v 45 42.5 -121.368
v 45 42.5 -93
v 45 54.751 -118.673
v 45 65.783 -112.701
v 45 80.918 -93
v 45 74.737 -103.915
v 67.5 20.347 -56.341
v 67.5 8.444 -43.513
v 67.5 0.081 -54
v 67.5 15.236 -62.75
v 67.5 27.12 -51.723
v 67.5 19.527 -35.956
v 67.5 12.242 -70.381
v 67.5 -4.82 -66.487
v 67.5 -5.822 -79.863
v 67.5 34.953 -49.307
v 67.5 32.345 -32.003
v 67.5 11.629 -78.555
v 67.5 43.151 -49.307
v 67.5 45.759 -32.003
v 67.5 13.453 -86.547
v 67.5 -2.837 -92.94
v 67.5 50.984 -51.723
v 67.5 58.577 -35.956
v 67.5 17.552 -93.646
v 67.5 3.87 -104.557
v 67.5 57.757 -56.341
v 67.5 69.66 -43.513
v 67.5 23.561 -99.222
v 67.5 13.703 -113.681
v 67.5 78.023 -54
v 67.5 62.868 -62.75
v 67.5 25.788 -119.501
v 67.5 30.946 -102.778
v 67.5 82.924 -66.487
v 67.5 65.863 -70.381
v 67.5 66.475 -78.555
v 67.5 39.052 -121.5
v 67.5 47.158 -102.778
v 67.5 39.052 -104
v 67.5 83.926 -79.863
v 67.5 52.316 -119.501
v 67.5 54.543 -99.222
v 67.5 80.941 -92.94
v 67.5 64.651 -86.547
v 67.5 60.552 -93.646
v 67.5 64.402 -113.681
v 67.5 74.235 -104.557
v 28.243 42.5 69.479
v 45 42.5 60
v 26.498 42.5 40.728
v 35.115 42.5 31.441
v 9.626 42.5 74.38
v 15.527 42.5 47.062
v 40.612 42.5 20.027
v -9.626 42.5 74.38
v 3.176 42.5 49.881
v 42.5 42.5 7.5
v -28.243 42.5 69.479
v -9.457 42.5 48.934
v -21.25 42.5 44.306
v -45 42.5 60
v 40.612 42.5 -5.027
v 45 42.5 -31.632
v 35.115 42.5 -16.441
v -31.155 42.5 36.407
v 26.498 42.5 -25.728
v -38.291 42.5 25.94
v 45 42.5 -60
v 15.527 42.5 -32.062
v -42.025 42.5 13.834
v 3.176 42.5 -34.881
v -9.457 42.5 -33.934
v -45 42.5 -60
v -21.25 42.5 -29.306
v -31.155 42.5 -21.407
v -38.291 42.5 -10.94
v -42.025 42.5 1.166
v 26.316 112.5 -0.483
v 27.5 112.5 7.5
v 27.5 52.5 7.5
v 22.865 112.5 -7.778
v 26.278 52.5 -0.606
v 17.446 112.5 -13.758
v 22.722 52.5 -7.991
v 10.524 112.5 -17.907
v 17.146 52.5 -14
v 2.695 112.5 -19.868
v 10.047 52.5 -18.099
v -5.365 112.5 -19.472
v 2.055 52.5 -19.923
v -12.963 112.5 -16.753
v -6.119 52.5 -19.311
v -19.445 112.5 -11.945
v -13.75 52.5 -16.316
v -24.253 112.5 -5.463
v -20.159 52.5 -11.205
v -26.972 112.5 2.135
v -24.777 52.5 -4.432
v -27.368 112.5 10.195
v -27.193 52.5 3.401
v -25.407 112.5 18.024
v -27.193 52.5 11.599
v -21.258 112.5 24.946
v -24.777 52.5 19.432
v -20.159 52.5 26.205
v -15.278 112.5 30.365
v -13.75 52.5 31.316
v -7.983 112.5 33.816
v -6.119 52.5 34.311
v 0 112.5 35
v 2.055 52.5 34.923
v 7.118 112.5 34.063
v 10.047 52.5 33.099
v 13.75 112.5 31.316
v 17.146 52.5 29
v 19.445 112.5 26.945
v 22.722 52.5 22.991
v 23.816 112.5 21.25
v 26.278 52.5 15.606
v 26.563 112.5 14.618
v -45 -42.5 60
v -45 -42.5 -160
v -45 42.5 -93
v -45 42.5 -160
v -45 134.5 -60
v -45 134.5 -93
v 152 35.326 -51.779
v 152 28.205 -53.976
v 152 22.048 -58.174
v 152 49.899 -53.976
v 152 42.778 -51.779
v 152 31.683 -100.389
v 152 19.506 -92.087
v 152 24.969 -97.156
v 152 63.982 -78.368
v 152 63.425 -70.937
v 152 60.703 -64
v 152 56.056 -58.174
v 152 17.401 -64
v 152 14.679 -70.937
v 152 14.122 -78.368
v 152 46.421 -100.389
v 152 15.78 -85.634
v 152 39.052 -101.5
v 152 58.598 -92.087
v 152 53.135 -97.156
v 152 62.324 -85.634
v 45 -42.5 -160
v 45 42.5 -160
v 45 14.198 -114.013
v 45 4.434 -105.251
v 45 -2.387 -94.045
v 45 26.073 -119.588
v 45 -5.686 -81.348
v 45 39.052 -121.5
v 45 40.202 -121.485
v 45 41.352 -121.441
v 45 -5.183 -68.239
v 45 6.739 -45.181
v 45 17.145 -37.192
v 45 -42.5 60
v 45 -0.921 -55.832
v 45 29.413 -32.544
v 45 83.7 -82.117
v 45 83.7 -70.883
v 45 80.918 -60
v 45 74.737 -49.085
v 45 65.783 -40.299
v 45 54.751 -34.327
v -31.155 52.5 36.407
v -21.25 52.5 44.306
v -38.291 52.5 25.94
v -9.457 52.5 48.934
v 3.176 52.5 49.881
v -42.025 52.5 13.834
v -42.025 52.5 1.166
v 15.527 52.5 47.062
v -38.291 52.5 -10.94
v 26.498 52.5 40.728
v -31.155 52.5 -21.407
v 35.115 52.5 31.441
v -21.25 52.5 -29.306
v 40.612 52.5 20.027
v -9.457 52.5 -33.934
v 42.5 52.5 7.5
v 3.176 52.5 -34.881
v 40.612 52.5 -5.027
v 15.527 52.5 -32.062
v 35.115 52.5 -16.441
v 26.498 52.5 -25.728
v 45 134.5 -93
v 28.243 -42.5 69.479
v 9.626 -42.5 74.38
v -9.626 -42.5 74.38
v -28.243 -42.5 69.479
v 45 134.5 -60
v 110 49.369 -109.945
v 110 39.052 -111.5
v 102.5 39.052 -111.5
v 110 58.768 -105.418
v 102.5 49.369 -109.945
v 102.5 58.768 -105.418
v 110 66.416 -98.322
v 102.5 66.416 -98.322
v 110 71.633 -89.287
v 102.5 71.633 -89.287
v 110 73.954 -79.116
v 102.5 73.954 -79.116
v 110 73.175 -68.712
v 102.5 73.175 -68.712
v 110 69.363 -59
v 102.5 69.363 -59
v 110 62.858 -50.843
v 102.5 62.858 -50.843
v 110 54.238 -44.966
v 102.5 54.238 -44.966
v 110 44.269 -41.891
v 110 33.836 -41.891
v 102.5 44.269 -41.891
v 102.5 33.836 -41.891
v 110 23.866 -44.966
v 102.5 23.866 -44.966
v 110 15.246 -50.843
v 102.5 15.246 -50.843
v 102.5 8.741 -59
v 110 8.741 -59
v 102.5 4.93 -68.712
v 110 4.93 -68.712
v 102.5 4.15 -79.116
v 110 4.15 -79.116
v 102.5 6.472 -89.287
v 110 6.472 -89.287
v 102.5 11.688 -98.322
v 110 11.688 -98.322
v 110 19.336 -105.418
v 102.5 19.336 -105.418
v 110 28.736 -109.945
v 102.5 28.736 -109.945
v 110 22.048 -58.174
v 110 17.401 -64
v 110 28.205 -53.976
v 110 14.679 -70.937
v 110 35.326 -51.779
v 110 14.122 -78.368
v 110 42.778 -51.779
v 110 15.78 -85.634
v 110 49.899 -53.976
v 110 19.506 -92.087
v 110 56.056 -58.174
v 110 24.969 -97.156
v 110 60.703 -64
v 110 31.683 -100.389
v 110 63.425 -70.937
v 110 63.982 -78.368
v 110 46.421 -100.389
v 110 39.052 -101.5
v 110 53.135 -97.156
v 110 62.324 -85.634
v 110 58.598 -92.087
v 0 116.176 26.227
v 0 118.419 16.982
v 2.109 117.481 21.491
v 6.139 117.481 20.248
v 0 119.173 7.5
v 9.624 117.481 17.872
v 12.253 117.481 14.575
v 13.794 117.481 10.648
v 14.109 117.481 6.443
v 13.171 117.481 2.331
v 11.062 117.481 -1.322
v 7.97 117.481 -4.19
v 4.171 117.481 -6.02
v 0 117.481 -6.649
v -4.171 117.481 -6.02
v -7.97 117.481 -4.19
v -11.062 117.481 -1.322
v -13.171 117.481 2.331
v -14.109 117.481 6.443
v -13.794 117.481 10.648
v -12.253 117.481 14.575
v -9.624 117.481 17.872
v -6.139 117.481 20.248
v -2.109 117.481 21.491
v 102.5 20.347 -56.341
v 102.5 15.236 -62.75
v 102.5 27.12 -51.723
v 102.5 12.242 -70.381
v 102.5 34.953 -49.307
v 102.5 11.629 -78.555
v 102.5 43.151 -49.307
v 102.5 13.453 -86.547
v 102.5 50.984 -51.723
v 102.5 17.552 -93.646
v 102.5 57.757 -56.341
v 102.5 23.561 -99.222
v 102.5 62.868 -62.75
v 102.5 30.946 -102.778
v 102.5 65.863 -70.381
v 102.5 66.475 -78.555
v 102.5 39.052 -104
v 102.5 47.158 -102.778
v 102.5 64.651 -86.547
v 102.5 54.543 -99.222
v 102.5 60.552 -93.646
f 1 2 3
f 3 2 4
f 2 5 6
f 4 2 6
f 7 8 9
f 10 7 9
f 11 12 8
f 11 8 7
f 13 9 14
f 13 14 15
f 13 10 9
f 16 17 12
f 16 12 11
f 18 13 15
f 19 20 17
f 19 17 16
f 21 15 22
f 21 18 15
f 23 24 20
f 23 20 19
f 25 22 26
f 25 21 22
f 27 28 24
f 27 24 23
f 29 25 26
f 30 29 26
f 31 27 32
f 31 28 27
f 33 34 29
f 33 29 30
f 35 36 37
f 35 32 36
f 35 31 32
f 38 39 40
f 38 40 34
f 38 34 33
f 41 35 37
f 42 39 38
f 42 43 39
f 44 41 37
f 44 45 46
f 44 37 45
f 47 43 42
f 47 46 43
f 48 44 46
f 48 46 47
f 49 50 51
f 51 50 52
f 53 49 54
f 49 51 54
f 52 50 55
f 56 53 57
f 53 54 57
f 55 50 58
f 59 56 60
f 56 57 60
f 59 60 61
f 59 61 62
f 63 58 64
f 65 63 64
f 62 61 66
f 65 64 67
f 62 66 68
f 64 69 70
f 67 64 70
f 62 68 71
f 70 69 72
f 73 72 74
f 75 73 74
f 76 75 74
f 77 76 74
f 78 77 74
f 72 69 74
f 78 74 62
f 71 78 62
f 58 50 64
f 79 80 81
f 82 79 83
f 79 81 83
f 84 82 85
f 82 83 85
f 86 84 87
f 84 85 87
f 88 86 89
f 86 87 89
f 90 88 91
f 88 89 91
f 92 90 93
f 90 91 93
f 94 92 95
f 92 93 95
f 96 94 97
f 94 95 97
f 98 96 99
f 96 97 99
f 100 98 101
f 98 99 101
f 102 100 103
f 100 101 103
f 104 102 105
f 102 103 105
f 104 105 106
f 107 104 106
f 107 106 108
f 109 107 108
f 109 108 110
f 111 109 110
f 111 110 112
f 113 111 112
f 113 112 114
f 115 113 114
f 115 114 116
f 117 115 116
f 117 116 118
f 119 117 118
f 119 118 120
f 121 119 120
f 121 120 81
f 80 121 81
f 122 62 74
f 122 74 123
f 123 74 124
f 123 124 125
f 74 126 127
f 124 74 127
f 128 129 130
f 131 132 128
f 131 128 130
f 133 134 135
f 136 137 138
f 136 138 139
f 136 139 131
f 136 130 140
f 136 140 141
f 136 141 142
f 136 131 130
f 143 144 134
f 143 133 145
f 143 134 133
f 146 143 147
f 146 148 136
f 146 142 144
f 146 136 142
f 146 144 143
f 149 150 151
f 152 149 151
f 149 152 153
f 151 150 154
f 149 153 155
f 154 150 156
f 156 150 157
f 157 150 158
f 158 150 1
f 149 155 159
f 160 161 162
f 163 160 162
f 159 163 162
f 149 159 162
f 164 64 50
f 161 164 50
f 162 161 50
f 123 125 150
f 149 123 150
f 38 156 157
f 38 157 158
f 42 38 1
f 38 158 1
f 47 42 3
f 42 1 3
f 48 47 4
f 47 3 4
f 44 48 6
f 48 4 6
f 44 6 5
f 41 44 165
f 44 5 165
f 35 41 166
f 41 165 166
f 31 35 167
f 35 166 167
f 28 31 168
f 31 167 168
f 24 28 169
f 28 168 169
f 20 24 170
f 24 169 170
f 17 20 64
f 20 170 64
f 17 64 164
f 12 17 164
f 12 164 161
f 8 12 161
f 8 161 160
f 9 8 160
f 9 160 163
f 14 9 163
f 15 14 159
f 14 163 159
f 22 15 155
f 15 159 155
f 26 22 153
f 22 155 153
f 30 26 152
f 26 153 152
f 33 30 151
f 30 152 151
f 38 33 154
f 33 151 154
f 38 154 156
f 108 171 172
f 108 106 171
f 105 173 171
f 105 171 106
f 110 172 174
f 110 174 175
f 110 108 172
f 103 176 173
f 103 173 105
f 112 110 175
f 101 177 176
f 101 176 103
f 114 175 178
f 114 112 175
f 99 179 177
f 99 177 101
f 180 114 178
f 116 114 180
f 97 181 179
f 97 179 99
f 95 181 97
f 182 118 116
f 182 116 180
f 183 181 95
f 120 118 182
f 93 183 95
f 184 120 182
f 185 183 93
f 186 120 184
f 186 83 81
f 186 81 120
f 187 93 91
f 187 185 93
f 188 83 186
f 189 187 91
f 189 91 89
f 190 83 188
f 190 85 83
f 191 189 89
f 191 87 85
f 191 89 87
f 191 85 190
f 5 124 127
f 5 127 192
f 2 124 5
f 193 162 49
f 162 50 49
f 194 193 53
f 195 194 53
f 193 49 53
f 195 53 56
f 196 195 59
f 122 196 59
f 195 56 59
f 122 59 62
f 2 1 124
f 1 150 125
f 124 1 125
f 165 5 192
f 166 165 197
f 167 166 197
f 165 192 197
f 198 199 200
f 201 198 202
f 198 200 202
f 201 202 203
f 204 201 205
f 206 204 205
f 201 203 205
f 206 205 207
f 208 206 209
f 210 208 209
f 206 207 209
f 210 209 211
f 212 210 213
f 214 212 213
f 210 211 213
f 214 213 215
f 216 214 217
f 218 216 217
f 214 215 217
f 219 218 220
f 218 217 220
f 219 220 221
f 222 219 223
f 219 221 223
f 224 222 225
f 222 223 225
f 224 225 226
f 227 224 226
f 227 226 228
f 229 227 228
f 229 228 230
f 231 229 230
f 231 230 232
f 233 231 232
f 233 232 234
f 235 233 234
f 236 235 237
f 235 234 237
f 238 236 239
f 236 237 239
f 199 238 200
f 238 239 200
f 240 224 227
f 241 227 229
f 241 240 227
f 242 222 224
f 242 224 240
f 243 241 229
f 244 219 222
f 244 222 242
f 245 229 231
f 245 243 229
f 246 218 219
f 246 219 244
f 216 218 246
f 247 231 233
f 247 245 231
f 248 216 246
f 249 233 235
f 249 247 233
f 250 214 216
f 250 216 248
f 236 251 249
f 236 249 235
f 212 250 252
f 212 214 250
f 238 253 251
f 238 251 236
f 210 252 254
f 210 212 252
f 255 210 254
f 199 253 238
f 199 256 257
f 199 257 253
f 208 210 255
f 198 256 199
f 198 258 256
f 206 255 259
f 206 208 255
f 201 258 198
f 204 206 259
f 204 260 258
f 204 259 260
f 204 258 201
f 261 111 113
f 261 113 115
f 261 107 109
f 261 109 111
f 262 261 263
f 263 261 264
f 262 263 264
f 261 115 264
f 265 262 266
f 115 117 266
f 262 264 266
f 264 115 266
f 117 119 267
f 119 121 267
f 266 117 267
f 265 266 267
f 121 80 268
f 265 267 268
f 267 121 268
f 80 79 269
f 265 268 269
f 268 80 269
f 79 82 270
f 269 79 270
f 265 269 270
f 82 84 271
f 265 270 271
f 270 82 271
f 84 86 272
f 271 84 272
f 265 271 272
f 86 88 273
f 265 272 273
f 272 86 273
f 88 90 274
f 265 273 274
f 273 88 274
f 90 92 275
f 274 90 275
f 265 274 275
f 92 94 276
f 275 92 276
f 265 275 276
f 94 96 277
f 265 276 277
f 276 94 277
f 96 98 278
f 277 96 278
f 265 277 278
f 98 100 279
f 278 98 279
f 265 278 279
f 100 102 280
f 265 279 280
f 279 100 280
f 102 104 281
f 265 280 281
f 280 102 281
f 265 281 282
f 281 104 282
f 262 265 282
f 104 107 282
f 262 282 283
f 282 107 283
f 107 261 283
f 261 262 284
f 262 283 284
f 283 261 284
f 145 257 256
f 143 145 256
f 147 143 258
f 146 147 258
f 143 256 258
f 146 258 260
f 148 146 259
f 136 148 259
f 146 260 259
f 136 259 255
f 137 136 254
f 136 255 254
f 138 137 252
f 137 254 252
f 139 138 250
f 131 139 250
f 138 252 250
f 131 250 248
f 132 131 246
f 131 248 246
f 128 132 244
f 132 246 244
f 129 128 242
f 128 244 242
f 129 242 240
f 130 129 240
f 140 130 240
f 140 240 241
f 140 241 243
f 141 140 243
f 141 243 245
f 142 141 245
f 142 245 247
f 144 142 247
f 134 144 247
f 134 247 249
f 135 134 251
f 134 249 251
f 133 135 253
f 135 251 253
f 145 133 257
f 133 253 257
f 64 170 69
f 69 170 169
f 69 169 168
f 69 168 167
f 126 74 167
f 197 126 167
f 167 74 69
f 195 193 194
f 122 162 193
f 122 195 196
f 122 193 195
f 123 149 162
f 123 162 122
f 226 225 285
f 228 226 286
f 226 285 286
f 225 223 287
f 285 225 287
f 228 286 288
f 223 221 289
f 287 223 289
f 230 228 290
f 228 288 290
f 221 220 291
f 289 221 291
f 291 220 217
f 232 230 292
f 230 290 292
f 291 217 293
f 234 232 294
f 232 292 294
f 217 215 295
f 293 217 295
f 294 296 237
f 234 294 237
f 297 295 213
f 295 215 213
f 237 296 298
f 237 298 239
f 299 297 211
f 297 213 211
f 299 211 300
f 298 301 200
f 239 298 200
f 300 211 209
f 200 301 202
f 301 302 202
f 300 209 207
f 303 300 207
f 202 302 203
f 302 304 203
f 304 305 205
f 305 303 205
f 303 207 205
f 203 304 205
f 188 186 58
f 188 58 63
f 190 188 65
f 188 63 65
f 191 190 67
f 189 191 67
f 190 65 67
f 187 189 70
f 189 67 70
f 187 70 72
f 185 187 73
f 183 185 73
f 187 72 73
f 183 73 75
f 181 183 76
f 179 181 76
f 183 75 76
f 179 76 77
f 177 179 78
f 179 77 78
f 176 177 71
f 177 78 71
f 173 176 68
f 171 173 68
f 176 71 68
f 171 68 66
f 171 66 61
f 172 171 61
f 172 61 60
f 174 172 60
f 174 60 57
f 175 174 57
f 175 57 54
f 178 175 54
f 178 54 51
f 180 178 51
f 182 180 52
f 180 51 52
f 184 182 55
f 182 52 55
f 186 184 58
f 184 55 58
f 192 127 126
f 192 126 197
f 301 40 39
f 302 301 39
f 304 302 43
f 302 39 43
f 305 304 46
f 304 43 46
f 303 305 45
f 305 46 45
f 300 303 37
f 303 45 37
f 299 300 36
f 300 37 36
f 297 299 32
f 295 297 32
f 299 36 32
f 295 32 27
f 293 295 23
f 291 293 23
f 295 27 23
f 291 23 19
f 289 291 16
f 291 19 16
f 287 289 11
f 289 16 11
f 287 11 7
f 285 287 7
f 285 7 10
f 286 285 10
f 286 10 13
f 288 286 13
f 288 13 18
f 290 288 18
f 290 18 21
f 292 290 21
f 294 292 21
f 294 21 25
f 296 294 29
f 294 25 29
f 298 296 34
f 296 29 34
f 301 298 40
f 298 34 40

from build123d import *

# Parameters (mm, degrees)
BOSS_EXTRUDE1_DEPTH = 42.5
SKETCH3_R           = 42.5
BOSS_EXTRUDE2_DEPTH = 10
SKETCH4_R           = 27.5
BOSS_EXTRUDE3_DEPTH = 60
SKETCH6_W           = 90
SKETCH6_H           = 33
BOSS_EXTRUDE4_DEPTH = 92
SKETCH7_R           = 45
BOSS_EXTRUDE5_DEPTH = 22.5
SKETCH9_R           = 27.5
BOSS_EXTRUDE6_DEPTH = 35
SKETCH10_R          = 35
BOSS_EXTRUDE7_DEPTH = 7.5
SKETCH11_R          = 25
BOSS_EXTRUDE8_DEPTH = 42


with BuildPart() as part:
    # Sketch2 → Boss-Extrude1 (new, symmetric)
    with BuildSketch(Plane(origin=(0, 0, 0), x_dir=(1, 0, 0), z_dir=(0, 1, 0))):
        with BuildLine():
            Line((-45, 60), (-45, 160))
            Line((-45, 160), (45, 160))
            Line((45, 160), (45, 60))
            Line((45, 60), (45, -60))
            ThreePointArc((45, -60), (0, -75), (-45, -60))
            Line((-45, -60), (-45, 60))
        make_face()
    extrude(amount=BOSS_EXTRUDE1_DEPTH, both=True)

    # Sketch3 → Boss-Extrude2 (add)
    with BuildSketch(Plane(origin=(0, 42.5, 0), x_dir=(1, 0, 0), z_dir=(0, 1, 0))):
        with Locations((0, -7.5)):
            Circle(SKETCH3_R)
    extrude(amount=BOSS_EXTRUDE2_DEPTH)

    # Sketch4 → Boss-Extrude3 (add)
    with BuildSketch(Plane(origin=(0, 52.5, 0), x_dir=(1, 0, 0), z_dir=(0, 1, 0))):
        with Locations((0, -7.5)):
            Circle(SKETCH4_R)
    extrude(amount=BOSS_EXTRUDE3_DEPTH)

    # Sketch5 → Revolve1 (revolve)
    with BuildSketch(Plane(origin=(0, 0, 0), x_dir=(0, 0, -1), z_dir=(1, 0, 0))):
        with BuildLine():
            Line((-35, 112.5), (-7.5, 112.5))
            Line((-7.5, 112.5), (-7.5, 119.173177481))
            ThreePointArc((-7.5, 119.173177481), (-21.6490397, 117.481021512), (-35, 112.5))
        make_face()
    revolve(axis=Axis((0, 112.5, 7.5), (0, 1, 0)))

    # Sketch6 → Boss-Extrude4 (add)
    with BuildSketch(Plane(origin=(0, 42.5, 0), x_dir=(1, 0, 0), z_dir=(0, 1, 0))):
        with Locations((0, 76.5)):
            Rectangle(SKETCH6_W, SKETCH6_H)
    extrude(amount=BOSS_EXTRUDE4_DEPTH)

    # Sketch7 → Boss-Extrude5 (add)
    with BuildSketch(Plane(origin=(45, 0, 0), x_dir=(0, 0, -1), z_dir=(1, 0, 0))):
        with Locations((76.5, 39.052114436)):
            Circle(SKETCH7_R)
    extrude(amount=BOSS_EXTRUDE5_DEPTH)

    # Sketch9 → Boss-Extrude6 (add)
    with BuildSketch(Plane(origin=(67.5, 0, 0), x_dir=(0, 0, -1), z_dir=(1, 0, 0))):
        with Locations((76.5, 39.052114436)):
            Circle(SKETCH9_R)
    extrude(amount=BOSS_EXTRUDE6_DEPTH)

    # Sketch10 → Boss-Extrude7 (add)
    with BuildSketch(Plane(origin=(102.5, 0, 0), x_dir=(0, 0, -1), z_dir=(1, 0, 0))):
        with Locations((76.5, 39.052114436)):
            Circle(SKETCH10_R)
    extrude(amount=BOSS_EXTRUDE7_DEPTH)

    # Sketch11 → Boss-Extrude8 (add)
    with BuildSketch(Plane(origin=(110, 0, 0), x_dir=(0, 0, -1), z_dir=(1, 0, 0))):
        with Locations((76.5, 39.052114436)):
            Circle(SKETCH11_R)
    extrude(amount=BOSS_EXTRUDE8_DEPTH)


solid = part.part
